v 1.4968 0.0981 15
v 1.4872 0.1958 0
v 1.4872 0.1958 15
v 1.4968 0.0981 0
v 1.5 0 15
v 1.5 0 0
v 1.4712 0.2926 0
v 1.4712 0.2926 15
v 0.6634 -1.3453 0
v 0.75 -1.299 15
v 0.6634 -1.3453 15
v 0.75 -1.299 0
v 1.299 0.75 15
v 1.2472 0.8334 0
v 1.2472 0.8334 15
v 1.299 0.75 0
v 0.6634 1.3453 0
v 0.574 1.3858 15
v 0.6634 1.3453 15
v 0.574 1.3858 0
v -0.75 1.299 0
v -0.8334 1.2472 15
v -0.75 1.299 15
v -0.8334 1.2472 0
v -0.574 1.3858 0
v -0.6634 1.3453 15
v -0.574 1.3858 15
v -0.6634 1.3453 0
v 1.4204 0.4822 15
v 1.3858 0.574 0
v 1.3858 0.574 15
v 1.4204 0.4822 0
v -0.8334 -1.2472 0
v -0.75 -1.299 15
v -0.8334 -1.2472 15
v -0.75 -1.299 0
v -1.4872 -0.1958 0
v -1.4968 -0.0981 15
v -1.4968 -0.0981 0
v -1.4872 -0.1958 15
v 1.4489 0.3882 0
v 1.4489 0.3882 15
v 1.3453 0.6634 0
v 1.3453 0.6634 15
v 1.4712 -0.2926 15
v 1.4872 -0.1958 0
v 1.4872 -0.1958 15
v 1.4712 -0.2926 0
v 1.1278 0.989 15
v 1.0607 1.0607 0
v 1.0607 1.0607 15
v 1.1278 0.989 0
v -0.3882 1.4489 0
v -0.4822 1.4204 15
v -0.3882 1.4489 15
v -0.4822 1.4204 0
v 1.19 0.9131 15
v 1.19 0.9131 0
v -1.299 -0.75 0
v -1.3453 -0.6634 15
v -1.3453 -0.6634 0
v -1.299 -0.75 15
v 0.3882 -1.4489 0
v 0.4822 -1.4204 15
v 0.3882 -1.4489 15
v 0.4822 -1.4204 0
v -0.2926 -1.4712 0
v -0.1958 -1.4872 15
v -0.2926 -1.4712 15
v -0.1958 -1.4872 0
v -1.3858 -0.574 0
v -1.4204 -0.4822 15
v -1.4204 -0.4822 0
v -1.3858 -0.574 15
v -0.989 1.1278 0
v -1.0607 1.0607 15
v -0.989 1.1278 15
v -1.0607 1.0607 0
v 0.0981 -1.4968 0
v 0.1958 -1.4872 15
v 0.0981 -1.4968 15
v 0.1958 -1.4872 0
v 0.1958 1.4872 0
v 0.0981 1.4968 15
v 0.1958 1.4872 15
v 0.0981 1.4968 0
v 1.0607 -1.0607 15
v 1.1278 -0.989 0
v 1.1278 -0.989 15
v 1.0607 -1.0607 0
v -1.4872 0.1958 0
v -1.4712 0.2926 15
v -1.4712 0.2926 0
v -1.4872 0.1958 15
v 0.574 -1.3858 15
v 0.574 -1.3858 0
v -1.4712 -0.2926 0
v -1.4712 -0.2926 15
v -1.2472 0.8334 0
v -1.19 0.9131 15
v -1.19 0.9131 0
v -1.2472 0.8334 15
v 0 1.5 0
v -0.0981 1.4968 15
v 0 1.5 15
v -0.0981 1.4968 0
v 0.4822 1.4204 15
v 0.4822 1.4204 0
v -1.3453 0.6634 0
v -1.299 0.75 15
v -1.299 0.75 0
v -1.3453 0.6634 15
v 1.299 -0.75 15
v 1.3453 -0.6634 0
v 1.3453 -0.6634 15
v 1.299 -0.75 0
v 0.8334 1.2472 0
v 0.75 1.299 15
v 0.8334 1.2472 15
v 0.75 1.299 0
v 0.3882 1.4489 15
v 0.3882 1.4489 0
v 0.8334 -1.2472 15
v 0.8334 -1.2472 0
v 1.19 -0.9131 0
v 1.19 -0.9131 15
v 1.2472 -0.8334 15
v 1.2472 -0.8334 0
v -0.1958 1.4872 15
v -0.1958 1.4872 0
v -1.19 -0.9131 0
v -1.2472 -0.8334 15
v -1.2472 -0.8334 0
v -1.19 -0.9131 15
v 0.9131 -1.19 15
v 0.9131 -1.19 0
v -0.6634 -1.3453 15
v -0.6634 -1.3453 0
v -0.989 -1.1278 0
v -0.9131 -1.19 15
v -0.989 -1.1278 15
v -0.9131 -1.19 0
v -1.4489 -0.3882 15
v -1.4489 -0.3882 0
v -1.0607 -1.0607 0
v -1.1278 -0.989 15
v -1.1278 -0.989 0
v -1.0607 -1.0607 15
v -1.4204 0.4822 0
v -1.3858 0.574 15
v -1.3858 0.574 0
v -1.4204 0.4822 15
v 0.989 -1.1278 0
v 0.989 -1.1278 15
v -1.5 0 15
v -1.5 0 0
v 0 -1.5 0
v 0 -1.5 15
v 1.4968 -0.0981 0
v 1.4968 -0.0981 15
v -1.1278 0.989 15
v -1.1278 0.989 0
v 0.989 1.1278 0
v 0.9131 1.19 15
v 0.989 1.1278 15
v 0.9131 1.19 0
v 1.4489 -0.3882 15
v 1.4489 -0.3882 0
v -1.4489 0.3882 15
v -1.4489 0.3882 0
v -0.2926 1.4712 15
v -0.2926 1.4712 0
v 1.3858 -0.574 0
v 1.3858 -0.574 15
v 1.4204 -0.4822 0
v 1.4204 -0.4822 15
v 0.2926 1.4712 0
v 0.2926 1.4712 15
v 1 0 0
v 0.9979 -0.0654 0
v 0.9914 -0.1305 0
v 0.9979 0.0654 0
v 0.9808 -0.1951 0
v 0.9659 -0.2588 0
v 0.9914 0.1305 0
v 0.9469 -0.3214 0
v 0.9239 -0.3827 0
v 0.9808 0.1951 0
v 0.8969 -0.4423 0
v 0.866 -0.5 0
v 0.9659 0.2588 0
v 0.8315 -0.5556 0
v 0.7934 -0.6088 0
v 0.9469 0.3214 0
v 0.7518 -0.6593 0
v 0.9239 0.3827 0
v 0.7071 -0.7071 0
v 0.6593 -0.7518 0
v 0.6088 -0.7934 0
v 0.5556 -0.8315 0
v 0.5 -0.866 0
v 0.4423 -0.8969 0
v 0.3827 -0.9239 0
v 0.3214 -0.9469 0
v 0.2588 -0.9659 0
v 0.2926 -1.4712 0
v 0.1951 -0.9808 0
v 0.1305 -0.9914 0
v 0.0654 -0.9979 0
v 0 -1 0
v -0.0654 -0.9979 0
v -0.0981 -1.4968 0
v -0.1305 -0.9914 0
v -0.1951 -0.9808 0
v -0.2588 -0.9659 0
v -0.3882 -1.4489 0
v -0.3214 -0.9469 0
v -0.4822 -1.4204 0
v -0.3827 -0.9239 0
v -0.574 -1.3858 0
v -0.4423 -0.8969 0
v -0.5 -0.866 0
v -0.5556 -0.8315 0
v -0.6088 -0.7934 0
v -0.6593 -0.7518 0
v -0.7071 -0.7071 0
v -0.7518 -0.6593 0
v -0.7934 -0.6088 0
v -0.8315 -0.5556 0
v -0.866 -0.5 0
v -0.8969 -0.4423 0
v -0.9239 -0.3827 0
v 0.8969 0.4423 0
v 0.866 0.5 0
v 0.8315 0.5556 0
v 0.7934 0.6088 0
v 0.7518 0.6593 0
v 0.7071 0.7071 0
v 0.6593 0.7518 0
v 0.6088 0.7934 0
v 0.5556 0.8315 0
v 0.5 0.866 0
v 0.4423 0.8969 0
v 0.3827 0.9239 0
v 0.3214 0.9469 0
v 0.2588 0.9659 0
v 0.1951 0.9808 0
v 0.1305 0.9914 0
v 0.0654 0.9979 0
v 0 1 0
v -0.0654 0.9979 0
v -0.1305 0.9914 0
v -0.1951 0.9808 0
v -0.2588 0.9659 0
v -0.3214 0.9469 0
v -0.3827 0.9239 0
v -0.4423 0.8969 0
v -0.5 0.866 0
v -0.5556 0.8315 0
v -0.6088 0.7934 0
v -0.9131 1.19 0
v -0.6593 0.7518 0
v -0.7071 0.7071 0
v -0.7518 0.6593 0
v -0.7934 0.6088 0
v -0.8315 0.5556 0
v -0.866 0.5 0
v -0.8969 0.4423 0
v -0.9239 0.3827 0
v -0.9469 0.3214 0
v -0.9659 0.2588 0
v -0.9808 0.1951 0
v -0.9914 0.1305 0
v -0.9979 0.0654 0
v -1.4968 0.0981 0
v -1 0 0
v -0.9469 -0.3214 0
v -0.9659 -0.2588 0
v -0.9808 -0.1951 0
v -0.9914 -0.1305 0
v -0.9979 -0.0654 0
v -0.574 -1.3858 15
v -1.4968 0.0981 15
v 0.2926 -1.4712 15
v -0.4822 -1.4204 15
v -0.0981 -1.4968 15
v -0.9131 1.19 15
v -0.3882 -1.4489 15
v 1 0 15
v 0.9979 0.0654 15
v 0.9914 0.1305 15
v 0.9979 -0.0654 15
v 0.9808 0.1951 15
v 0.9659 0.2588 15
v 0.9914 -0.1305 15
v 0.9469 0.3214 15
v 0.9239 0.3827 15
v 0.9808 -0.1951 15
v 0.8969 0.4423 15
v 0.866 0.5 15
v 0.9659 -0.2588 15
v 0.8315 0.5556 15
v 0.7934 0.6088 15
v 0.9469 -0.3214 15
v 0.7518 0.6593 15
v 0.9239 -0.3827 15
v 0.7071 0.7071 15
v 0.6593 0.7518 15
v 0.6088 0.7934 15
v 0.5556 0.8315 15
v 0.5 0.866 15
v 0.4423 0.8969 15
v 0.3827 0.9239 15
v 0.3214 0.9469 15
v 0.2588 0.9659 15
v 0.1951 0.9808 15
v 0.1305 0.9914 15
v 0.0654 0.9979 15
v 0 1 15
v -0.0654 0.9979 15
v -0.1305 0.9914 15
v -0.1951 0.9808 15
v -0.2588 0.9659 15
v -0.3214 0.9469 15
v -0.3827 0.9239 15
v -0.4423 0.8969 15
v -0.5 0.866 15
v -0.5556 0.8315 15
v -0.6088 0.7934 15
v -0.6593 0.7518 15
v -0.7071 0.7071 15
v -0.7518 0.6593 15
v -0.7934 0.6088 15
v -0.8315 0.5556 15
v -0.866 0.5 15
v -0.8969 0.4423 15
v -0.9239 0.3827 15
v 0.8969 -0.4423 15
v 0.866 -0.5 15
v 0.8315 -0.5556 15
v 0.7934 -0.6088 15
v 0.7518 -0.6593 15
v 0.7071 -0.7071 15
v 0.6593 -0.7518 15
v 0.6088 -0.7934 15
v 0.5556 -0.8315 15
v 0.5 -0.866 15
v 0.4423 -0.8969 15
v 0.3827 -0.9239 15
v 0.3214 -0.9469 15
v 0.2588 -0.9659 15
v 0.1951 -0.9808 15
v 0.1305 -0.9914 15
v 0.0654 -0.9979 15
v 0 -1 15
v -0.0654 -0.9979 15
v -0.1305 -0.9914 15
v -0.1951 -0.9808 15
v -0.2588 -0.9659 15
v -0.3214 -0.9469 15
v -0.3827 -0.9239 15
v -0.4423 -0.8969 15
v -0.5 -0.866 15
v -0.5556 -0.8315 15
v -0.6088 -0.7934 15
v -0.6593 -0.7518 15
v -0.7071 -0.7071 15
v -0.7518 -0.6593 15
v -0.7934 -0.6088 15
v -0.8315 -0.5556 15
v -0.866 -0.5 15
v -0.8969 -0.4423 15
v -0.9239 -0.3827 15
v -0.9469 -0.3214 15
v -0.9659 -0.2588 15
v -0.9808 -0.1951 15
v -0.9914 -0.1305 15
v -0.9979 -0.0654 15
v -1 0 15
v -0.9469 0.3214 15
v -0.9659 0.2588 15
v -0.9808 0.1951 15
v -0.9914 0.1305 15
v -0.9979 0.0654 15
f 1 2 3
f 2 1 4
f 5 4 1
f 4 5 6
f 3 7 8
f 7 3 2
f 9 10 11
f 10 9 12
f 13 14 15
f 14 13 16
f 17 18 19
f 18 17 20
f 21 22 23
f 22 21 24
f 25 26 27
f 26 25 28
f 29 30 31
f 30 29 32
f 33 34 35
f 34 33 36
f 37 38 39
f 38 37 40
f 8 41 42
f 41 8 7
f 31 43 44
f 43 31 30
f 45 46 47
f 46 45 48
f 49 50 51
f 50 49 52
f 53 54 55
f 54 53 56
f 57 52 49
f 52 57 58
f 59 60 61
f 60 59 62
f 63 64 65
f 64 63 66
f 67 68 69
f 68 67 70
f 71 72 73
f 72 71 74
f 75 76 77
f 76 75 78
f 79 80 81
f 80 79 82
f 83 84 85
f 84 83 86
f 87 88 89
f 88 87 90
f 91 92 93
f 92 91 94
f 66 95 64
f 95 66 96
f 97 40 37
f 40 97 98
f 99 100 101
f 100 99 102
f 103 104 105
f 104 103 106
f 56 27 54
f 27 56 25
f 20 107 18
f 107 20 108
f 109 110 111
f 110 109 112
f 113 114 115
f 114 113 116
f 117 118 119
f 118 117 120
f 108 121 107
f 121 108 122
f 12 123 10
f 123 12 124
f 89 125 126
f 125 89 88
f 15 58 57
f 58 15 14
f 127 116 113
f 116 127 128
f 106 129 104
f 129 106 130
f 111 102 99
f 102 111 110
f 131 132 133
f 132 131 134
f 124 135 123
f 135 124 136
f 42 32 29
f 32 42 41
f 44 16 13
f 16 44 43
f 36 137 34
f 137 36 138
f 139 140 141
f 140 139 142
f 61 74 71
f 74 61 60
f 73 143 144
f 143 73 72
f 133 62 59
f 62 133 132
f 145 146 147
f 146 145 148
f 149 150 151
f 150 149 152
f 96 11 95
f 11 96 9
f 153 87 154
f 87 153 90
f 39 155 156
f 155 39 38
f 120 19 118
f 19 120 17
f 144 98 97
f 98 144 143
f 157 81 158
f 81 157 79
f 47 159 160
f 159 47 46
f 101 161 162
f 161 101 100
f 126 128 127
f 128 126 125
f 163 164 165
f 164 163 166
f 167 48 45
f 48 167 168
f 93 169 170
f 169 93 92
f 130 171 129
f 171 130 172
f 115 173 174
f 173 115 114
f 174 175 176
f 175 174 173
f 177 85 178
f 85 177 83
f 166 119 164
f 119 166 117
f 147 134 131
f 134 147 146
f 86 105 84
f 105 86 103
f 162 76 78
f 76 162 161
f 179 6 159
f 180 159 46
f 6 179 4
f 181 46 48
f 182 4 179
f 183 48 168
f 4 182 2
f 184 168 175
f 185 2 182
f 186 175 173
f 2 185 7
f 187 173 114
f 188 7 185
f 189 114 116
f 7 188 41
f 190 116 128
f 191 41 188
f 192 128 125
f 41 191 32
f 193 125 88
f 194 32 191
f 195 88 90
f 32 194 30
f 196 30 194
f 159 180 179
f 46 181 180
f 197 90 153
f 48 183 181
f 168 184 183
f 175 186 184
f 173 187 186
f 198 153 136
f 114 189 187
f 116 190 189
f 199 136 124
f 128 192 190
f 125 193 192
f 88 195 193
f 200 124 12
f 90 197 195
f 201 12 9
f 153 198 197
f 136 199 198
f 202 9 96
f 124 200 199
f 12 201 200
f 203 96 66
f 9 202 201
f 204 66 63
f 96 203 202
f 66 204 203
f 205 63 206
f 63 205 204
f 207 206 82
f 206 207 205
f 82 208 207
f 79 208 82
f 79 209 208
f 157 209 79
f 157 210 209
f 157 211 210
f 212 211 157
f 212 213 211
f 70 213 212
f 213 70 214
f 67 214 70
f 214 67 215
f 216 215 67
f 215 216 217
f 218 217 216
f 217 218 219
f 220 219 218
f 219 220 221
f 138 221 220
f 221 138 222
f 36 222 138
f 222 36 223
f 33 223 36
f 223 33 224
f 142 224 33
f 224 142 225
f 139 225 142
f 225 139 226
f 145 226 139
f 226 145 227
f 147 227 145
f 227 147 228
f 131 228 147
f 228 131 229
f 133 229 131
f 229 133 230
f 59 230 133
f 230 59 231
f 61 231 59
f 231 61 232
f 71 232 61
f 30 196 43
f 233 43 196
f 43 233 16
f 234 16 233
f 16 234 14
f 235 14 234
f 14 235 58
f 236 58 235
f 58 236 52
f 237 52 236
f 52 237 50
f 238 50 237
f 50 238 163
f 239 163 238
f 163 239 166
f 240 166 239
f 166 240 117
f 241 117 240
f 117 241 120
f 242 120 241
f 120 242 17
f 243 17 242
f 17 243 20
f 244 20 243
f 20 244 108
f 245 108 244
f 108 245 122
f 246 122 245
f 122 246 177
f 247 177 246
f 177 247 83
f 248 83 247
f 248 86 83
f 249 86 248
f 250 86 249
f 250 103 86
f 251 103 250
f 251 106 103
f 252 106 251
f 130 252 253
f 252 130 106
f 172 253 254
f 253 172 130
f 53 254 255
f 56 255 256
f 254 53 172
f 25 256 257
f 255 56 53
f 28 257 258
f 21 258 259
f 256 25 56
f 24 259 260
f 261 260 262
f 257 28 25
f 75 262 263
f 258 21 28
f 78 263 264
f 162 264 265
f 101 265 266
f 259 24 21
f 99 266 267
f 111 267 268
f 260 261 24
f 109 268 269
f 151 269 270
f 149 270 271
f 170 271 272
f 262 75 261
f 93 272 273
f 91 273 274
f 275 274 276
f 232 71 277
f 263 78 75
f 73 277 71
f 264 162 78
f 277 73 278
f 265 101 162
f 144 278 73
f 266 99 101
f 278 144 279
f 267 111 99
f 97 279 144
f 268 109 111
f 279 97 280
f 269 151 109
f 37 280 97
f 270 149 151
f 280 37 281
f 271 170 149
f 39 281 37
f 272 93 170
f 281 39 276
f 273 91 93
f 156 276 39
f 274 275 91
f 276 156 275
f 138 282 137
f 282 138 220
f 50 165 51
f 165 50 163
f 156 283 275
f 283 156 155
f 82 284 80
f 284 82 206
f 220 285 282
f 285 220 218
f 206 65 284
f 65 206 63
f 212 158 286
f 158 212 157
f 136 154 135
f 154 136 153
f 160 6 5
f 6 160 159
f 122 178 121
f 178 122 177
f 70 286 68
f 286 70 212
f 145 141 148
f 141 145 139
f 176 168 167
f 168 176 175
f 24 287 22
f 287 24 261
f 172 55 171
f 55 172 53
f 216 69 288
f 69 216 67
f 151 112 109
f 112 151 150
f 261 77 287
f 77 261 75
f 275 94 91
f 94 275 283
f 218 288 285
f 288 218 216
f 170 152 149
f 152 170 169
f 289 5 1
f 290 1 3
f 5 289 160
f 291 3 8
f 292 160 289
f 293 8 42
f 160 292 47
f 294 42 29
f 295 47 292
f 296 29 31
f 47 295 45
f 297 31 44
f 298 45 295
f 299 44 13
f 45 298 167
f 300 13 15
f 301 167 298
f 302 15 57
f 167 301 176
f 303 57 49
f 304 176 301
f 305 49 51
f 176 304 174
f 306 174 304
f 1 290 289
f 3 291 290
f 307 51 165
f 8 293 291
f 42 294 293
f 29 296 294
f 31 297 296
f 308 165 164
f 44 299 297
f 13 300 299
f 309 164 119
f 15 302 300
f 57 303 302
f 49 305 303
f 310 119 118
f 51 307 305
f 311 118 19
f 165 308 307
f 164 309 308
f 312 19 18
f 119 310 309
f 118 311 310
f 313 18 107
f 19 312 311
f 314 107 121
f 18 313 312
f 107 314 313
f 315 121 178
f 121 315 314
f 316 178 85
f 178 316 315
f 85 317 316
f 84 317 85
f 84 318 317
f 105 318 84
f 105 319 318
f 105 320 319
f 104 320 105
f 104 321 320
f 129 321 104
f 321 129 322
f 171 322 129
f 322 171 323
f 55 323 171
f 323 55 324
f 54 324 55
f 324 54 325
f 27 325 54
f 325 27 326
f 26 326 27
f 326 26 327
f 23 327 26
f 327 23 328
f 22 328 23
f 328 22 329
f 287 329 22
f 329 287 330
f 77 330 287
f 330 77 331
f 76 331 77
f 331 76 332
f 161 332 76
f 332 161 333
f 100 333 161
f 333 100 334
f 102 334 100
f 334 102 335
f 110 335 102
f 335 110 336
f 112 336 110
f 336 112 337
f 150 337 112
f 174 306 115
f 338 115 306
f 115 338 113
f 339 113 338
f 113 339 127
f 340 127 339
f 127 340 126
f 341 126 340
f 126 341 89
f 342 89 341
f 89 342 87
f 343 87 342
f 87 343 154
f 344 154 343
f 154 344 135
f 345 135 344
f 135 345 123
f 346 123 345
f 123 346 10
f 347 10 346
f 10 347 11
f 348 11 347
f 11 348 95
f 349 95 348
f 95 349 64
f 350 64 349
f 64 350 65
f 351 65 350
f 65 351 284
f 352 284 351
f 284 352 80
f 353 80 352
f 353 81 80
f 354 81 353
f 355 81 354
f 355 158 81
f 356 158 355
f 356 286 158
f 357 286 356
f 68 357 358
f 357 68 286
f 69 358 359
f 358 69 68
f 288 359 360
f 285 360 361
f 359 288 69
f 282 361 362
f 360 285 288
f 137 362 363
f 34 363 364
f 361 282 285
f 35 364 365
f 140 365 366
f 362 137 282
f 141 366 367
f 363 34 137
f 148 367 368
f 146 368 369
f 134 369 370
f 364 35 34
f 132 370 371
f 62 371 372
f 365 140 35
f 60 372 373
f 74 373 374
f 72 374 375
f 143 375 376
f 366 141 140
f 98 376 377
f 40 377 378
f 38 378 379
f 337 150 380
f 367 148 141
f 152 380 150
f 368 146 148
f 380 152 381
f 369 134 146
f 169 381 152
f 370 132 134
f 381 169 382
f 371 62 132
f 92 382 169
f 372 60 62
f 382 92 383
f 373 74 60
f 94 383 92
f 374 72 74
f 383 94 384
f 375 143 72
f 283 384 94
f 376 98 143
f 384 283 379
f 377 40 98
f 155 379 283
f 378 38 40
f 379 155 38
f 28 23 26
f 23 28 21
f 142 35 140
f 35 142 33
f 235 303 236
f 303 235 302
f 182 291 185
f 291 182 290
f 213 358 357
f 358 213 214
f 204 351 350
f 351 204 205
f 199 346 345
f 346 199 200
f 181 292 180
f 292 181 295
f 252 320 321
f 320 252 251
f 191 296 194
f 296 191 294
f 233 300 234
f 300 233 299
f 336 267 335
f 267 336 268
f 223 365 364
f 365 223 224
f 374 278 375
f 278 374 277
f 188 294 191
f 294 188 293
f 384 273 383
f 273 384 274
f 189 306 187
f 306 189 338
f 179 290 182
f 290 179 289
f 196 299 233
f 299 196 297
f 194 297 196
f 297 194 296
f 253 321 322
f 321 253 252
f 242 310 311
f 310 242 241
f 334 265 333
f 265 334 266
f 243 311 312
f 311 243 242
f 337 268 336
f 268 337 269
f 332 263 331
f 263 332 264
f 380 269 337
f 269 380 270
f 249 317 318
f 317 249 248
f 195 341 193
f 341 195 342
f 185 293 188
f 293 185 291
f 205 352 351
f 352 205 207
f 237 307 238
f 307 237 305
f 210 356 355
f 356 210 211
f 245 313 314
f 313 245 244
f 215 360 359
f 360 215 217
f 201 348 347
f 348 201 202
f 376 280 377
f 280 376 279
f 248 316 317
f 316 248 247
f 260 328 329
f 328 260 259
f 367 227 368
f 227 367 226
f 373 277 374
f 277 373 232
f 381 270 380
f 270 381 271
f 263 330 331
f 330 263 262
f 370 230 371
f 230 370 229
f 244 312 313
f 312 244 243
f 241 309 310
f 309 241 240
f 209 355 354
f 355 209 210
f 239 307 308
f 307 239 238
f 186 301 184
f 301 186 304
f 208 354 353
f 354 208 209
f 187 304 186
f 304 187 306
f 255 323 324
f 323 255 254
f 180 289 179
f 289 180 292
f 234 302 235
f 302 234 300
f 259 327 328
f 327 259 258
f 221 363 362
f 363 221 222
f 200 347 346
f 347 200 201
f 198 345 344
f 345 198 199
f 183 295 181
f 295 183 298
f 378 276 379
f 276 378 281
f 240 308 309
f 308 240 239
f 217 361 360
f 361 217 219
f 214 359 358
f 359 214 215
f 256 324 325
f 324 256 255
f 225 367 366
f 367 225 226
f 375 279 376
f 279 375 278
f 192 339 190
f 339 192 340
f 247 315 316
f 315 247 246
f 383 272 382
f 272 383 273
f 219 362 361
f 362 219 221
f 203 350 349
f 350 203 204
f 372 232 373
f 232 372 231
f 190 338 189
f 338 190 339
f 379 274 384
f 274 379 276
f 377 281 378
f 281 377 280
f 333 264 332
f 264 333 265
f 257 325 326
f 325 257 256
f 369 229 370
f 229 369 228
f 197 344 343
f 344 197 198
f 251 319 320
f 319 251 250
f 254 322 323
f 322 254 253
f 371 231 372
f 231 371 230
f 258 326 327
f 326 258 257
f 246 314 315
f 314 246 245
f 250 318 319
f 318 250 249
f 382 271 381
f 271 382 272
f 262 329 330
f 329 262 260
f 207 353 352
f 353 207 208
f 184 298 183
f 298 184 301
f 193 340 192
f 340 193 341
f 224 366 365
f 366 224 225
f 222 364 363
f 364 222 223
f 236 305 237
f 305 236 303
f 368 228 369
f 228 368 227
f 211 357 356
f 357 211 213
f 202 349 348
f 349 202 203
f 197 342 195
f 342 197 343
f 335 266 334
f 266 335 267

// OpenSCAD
// PTFE heatshrink sleeving (standalone hollow tube)

// Parameters
length = 15; //[8:30:1]
forced_id = 0; //[0:10:1]
center = 1; //[0:1:1]
nominal_id = 2; //[1:6:1]
nominal_od = 3; //[2:10:1]
eps = 0.2; //[0.05:1:0.05]

// Smoothness
$fn = 96;

// Derived dimensions
id = (forced_id > 0) ? forced_id : nominal_id;
od = max(nominal_od, id + 0.2);          // ensure OD > ID
ir = id/2;
or = od/2;

module ptfe_heatshrink_sleeving() {
  color([0.85, 0.85, 0.8])  // off-white PTFE
  difference() {
    cylinder(h=length, r=or, center=center);
    cylinder(h=length + 2*eps, r=ir, center=center);
  }
}

ptfe_heatshrink_sleeving();
